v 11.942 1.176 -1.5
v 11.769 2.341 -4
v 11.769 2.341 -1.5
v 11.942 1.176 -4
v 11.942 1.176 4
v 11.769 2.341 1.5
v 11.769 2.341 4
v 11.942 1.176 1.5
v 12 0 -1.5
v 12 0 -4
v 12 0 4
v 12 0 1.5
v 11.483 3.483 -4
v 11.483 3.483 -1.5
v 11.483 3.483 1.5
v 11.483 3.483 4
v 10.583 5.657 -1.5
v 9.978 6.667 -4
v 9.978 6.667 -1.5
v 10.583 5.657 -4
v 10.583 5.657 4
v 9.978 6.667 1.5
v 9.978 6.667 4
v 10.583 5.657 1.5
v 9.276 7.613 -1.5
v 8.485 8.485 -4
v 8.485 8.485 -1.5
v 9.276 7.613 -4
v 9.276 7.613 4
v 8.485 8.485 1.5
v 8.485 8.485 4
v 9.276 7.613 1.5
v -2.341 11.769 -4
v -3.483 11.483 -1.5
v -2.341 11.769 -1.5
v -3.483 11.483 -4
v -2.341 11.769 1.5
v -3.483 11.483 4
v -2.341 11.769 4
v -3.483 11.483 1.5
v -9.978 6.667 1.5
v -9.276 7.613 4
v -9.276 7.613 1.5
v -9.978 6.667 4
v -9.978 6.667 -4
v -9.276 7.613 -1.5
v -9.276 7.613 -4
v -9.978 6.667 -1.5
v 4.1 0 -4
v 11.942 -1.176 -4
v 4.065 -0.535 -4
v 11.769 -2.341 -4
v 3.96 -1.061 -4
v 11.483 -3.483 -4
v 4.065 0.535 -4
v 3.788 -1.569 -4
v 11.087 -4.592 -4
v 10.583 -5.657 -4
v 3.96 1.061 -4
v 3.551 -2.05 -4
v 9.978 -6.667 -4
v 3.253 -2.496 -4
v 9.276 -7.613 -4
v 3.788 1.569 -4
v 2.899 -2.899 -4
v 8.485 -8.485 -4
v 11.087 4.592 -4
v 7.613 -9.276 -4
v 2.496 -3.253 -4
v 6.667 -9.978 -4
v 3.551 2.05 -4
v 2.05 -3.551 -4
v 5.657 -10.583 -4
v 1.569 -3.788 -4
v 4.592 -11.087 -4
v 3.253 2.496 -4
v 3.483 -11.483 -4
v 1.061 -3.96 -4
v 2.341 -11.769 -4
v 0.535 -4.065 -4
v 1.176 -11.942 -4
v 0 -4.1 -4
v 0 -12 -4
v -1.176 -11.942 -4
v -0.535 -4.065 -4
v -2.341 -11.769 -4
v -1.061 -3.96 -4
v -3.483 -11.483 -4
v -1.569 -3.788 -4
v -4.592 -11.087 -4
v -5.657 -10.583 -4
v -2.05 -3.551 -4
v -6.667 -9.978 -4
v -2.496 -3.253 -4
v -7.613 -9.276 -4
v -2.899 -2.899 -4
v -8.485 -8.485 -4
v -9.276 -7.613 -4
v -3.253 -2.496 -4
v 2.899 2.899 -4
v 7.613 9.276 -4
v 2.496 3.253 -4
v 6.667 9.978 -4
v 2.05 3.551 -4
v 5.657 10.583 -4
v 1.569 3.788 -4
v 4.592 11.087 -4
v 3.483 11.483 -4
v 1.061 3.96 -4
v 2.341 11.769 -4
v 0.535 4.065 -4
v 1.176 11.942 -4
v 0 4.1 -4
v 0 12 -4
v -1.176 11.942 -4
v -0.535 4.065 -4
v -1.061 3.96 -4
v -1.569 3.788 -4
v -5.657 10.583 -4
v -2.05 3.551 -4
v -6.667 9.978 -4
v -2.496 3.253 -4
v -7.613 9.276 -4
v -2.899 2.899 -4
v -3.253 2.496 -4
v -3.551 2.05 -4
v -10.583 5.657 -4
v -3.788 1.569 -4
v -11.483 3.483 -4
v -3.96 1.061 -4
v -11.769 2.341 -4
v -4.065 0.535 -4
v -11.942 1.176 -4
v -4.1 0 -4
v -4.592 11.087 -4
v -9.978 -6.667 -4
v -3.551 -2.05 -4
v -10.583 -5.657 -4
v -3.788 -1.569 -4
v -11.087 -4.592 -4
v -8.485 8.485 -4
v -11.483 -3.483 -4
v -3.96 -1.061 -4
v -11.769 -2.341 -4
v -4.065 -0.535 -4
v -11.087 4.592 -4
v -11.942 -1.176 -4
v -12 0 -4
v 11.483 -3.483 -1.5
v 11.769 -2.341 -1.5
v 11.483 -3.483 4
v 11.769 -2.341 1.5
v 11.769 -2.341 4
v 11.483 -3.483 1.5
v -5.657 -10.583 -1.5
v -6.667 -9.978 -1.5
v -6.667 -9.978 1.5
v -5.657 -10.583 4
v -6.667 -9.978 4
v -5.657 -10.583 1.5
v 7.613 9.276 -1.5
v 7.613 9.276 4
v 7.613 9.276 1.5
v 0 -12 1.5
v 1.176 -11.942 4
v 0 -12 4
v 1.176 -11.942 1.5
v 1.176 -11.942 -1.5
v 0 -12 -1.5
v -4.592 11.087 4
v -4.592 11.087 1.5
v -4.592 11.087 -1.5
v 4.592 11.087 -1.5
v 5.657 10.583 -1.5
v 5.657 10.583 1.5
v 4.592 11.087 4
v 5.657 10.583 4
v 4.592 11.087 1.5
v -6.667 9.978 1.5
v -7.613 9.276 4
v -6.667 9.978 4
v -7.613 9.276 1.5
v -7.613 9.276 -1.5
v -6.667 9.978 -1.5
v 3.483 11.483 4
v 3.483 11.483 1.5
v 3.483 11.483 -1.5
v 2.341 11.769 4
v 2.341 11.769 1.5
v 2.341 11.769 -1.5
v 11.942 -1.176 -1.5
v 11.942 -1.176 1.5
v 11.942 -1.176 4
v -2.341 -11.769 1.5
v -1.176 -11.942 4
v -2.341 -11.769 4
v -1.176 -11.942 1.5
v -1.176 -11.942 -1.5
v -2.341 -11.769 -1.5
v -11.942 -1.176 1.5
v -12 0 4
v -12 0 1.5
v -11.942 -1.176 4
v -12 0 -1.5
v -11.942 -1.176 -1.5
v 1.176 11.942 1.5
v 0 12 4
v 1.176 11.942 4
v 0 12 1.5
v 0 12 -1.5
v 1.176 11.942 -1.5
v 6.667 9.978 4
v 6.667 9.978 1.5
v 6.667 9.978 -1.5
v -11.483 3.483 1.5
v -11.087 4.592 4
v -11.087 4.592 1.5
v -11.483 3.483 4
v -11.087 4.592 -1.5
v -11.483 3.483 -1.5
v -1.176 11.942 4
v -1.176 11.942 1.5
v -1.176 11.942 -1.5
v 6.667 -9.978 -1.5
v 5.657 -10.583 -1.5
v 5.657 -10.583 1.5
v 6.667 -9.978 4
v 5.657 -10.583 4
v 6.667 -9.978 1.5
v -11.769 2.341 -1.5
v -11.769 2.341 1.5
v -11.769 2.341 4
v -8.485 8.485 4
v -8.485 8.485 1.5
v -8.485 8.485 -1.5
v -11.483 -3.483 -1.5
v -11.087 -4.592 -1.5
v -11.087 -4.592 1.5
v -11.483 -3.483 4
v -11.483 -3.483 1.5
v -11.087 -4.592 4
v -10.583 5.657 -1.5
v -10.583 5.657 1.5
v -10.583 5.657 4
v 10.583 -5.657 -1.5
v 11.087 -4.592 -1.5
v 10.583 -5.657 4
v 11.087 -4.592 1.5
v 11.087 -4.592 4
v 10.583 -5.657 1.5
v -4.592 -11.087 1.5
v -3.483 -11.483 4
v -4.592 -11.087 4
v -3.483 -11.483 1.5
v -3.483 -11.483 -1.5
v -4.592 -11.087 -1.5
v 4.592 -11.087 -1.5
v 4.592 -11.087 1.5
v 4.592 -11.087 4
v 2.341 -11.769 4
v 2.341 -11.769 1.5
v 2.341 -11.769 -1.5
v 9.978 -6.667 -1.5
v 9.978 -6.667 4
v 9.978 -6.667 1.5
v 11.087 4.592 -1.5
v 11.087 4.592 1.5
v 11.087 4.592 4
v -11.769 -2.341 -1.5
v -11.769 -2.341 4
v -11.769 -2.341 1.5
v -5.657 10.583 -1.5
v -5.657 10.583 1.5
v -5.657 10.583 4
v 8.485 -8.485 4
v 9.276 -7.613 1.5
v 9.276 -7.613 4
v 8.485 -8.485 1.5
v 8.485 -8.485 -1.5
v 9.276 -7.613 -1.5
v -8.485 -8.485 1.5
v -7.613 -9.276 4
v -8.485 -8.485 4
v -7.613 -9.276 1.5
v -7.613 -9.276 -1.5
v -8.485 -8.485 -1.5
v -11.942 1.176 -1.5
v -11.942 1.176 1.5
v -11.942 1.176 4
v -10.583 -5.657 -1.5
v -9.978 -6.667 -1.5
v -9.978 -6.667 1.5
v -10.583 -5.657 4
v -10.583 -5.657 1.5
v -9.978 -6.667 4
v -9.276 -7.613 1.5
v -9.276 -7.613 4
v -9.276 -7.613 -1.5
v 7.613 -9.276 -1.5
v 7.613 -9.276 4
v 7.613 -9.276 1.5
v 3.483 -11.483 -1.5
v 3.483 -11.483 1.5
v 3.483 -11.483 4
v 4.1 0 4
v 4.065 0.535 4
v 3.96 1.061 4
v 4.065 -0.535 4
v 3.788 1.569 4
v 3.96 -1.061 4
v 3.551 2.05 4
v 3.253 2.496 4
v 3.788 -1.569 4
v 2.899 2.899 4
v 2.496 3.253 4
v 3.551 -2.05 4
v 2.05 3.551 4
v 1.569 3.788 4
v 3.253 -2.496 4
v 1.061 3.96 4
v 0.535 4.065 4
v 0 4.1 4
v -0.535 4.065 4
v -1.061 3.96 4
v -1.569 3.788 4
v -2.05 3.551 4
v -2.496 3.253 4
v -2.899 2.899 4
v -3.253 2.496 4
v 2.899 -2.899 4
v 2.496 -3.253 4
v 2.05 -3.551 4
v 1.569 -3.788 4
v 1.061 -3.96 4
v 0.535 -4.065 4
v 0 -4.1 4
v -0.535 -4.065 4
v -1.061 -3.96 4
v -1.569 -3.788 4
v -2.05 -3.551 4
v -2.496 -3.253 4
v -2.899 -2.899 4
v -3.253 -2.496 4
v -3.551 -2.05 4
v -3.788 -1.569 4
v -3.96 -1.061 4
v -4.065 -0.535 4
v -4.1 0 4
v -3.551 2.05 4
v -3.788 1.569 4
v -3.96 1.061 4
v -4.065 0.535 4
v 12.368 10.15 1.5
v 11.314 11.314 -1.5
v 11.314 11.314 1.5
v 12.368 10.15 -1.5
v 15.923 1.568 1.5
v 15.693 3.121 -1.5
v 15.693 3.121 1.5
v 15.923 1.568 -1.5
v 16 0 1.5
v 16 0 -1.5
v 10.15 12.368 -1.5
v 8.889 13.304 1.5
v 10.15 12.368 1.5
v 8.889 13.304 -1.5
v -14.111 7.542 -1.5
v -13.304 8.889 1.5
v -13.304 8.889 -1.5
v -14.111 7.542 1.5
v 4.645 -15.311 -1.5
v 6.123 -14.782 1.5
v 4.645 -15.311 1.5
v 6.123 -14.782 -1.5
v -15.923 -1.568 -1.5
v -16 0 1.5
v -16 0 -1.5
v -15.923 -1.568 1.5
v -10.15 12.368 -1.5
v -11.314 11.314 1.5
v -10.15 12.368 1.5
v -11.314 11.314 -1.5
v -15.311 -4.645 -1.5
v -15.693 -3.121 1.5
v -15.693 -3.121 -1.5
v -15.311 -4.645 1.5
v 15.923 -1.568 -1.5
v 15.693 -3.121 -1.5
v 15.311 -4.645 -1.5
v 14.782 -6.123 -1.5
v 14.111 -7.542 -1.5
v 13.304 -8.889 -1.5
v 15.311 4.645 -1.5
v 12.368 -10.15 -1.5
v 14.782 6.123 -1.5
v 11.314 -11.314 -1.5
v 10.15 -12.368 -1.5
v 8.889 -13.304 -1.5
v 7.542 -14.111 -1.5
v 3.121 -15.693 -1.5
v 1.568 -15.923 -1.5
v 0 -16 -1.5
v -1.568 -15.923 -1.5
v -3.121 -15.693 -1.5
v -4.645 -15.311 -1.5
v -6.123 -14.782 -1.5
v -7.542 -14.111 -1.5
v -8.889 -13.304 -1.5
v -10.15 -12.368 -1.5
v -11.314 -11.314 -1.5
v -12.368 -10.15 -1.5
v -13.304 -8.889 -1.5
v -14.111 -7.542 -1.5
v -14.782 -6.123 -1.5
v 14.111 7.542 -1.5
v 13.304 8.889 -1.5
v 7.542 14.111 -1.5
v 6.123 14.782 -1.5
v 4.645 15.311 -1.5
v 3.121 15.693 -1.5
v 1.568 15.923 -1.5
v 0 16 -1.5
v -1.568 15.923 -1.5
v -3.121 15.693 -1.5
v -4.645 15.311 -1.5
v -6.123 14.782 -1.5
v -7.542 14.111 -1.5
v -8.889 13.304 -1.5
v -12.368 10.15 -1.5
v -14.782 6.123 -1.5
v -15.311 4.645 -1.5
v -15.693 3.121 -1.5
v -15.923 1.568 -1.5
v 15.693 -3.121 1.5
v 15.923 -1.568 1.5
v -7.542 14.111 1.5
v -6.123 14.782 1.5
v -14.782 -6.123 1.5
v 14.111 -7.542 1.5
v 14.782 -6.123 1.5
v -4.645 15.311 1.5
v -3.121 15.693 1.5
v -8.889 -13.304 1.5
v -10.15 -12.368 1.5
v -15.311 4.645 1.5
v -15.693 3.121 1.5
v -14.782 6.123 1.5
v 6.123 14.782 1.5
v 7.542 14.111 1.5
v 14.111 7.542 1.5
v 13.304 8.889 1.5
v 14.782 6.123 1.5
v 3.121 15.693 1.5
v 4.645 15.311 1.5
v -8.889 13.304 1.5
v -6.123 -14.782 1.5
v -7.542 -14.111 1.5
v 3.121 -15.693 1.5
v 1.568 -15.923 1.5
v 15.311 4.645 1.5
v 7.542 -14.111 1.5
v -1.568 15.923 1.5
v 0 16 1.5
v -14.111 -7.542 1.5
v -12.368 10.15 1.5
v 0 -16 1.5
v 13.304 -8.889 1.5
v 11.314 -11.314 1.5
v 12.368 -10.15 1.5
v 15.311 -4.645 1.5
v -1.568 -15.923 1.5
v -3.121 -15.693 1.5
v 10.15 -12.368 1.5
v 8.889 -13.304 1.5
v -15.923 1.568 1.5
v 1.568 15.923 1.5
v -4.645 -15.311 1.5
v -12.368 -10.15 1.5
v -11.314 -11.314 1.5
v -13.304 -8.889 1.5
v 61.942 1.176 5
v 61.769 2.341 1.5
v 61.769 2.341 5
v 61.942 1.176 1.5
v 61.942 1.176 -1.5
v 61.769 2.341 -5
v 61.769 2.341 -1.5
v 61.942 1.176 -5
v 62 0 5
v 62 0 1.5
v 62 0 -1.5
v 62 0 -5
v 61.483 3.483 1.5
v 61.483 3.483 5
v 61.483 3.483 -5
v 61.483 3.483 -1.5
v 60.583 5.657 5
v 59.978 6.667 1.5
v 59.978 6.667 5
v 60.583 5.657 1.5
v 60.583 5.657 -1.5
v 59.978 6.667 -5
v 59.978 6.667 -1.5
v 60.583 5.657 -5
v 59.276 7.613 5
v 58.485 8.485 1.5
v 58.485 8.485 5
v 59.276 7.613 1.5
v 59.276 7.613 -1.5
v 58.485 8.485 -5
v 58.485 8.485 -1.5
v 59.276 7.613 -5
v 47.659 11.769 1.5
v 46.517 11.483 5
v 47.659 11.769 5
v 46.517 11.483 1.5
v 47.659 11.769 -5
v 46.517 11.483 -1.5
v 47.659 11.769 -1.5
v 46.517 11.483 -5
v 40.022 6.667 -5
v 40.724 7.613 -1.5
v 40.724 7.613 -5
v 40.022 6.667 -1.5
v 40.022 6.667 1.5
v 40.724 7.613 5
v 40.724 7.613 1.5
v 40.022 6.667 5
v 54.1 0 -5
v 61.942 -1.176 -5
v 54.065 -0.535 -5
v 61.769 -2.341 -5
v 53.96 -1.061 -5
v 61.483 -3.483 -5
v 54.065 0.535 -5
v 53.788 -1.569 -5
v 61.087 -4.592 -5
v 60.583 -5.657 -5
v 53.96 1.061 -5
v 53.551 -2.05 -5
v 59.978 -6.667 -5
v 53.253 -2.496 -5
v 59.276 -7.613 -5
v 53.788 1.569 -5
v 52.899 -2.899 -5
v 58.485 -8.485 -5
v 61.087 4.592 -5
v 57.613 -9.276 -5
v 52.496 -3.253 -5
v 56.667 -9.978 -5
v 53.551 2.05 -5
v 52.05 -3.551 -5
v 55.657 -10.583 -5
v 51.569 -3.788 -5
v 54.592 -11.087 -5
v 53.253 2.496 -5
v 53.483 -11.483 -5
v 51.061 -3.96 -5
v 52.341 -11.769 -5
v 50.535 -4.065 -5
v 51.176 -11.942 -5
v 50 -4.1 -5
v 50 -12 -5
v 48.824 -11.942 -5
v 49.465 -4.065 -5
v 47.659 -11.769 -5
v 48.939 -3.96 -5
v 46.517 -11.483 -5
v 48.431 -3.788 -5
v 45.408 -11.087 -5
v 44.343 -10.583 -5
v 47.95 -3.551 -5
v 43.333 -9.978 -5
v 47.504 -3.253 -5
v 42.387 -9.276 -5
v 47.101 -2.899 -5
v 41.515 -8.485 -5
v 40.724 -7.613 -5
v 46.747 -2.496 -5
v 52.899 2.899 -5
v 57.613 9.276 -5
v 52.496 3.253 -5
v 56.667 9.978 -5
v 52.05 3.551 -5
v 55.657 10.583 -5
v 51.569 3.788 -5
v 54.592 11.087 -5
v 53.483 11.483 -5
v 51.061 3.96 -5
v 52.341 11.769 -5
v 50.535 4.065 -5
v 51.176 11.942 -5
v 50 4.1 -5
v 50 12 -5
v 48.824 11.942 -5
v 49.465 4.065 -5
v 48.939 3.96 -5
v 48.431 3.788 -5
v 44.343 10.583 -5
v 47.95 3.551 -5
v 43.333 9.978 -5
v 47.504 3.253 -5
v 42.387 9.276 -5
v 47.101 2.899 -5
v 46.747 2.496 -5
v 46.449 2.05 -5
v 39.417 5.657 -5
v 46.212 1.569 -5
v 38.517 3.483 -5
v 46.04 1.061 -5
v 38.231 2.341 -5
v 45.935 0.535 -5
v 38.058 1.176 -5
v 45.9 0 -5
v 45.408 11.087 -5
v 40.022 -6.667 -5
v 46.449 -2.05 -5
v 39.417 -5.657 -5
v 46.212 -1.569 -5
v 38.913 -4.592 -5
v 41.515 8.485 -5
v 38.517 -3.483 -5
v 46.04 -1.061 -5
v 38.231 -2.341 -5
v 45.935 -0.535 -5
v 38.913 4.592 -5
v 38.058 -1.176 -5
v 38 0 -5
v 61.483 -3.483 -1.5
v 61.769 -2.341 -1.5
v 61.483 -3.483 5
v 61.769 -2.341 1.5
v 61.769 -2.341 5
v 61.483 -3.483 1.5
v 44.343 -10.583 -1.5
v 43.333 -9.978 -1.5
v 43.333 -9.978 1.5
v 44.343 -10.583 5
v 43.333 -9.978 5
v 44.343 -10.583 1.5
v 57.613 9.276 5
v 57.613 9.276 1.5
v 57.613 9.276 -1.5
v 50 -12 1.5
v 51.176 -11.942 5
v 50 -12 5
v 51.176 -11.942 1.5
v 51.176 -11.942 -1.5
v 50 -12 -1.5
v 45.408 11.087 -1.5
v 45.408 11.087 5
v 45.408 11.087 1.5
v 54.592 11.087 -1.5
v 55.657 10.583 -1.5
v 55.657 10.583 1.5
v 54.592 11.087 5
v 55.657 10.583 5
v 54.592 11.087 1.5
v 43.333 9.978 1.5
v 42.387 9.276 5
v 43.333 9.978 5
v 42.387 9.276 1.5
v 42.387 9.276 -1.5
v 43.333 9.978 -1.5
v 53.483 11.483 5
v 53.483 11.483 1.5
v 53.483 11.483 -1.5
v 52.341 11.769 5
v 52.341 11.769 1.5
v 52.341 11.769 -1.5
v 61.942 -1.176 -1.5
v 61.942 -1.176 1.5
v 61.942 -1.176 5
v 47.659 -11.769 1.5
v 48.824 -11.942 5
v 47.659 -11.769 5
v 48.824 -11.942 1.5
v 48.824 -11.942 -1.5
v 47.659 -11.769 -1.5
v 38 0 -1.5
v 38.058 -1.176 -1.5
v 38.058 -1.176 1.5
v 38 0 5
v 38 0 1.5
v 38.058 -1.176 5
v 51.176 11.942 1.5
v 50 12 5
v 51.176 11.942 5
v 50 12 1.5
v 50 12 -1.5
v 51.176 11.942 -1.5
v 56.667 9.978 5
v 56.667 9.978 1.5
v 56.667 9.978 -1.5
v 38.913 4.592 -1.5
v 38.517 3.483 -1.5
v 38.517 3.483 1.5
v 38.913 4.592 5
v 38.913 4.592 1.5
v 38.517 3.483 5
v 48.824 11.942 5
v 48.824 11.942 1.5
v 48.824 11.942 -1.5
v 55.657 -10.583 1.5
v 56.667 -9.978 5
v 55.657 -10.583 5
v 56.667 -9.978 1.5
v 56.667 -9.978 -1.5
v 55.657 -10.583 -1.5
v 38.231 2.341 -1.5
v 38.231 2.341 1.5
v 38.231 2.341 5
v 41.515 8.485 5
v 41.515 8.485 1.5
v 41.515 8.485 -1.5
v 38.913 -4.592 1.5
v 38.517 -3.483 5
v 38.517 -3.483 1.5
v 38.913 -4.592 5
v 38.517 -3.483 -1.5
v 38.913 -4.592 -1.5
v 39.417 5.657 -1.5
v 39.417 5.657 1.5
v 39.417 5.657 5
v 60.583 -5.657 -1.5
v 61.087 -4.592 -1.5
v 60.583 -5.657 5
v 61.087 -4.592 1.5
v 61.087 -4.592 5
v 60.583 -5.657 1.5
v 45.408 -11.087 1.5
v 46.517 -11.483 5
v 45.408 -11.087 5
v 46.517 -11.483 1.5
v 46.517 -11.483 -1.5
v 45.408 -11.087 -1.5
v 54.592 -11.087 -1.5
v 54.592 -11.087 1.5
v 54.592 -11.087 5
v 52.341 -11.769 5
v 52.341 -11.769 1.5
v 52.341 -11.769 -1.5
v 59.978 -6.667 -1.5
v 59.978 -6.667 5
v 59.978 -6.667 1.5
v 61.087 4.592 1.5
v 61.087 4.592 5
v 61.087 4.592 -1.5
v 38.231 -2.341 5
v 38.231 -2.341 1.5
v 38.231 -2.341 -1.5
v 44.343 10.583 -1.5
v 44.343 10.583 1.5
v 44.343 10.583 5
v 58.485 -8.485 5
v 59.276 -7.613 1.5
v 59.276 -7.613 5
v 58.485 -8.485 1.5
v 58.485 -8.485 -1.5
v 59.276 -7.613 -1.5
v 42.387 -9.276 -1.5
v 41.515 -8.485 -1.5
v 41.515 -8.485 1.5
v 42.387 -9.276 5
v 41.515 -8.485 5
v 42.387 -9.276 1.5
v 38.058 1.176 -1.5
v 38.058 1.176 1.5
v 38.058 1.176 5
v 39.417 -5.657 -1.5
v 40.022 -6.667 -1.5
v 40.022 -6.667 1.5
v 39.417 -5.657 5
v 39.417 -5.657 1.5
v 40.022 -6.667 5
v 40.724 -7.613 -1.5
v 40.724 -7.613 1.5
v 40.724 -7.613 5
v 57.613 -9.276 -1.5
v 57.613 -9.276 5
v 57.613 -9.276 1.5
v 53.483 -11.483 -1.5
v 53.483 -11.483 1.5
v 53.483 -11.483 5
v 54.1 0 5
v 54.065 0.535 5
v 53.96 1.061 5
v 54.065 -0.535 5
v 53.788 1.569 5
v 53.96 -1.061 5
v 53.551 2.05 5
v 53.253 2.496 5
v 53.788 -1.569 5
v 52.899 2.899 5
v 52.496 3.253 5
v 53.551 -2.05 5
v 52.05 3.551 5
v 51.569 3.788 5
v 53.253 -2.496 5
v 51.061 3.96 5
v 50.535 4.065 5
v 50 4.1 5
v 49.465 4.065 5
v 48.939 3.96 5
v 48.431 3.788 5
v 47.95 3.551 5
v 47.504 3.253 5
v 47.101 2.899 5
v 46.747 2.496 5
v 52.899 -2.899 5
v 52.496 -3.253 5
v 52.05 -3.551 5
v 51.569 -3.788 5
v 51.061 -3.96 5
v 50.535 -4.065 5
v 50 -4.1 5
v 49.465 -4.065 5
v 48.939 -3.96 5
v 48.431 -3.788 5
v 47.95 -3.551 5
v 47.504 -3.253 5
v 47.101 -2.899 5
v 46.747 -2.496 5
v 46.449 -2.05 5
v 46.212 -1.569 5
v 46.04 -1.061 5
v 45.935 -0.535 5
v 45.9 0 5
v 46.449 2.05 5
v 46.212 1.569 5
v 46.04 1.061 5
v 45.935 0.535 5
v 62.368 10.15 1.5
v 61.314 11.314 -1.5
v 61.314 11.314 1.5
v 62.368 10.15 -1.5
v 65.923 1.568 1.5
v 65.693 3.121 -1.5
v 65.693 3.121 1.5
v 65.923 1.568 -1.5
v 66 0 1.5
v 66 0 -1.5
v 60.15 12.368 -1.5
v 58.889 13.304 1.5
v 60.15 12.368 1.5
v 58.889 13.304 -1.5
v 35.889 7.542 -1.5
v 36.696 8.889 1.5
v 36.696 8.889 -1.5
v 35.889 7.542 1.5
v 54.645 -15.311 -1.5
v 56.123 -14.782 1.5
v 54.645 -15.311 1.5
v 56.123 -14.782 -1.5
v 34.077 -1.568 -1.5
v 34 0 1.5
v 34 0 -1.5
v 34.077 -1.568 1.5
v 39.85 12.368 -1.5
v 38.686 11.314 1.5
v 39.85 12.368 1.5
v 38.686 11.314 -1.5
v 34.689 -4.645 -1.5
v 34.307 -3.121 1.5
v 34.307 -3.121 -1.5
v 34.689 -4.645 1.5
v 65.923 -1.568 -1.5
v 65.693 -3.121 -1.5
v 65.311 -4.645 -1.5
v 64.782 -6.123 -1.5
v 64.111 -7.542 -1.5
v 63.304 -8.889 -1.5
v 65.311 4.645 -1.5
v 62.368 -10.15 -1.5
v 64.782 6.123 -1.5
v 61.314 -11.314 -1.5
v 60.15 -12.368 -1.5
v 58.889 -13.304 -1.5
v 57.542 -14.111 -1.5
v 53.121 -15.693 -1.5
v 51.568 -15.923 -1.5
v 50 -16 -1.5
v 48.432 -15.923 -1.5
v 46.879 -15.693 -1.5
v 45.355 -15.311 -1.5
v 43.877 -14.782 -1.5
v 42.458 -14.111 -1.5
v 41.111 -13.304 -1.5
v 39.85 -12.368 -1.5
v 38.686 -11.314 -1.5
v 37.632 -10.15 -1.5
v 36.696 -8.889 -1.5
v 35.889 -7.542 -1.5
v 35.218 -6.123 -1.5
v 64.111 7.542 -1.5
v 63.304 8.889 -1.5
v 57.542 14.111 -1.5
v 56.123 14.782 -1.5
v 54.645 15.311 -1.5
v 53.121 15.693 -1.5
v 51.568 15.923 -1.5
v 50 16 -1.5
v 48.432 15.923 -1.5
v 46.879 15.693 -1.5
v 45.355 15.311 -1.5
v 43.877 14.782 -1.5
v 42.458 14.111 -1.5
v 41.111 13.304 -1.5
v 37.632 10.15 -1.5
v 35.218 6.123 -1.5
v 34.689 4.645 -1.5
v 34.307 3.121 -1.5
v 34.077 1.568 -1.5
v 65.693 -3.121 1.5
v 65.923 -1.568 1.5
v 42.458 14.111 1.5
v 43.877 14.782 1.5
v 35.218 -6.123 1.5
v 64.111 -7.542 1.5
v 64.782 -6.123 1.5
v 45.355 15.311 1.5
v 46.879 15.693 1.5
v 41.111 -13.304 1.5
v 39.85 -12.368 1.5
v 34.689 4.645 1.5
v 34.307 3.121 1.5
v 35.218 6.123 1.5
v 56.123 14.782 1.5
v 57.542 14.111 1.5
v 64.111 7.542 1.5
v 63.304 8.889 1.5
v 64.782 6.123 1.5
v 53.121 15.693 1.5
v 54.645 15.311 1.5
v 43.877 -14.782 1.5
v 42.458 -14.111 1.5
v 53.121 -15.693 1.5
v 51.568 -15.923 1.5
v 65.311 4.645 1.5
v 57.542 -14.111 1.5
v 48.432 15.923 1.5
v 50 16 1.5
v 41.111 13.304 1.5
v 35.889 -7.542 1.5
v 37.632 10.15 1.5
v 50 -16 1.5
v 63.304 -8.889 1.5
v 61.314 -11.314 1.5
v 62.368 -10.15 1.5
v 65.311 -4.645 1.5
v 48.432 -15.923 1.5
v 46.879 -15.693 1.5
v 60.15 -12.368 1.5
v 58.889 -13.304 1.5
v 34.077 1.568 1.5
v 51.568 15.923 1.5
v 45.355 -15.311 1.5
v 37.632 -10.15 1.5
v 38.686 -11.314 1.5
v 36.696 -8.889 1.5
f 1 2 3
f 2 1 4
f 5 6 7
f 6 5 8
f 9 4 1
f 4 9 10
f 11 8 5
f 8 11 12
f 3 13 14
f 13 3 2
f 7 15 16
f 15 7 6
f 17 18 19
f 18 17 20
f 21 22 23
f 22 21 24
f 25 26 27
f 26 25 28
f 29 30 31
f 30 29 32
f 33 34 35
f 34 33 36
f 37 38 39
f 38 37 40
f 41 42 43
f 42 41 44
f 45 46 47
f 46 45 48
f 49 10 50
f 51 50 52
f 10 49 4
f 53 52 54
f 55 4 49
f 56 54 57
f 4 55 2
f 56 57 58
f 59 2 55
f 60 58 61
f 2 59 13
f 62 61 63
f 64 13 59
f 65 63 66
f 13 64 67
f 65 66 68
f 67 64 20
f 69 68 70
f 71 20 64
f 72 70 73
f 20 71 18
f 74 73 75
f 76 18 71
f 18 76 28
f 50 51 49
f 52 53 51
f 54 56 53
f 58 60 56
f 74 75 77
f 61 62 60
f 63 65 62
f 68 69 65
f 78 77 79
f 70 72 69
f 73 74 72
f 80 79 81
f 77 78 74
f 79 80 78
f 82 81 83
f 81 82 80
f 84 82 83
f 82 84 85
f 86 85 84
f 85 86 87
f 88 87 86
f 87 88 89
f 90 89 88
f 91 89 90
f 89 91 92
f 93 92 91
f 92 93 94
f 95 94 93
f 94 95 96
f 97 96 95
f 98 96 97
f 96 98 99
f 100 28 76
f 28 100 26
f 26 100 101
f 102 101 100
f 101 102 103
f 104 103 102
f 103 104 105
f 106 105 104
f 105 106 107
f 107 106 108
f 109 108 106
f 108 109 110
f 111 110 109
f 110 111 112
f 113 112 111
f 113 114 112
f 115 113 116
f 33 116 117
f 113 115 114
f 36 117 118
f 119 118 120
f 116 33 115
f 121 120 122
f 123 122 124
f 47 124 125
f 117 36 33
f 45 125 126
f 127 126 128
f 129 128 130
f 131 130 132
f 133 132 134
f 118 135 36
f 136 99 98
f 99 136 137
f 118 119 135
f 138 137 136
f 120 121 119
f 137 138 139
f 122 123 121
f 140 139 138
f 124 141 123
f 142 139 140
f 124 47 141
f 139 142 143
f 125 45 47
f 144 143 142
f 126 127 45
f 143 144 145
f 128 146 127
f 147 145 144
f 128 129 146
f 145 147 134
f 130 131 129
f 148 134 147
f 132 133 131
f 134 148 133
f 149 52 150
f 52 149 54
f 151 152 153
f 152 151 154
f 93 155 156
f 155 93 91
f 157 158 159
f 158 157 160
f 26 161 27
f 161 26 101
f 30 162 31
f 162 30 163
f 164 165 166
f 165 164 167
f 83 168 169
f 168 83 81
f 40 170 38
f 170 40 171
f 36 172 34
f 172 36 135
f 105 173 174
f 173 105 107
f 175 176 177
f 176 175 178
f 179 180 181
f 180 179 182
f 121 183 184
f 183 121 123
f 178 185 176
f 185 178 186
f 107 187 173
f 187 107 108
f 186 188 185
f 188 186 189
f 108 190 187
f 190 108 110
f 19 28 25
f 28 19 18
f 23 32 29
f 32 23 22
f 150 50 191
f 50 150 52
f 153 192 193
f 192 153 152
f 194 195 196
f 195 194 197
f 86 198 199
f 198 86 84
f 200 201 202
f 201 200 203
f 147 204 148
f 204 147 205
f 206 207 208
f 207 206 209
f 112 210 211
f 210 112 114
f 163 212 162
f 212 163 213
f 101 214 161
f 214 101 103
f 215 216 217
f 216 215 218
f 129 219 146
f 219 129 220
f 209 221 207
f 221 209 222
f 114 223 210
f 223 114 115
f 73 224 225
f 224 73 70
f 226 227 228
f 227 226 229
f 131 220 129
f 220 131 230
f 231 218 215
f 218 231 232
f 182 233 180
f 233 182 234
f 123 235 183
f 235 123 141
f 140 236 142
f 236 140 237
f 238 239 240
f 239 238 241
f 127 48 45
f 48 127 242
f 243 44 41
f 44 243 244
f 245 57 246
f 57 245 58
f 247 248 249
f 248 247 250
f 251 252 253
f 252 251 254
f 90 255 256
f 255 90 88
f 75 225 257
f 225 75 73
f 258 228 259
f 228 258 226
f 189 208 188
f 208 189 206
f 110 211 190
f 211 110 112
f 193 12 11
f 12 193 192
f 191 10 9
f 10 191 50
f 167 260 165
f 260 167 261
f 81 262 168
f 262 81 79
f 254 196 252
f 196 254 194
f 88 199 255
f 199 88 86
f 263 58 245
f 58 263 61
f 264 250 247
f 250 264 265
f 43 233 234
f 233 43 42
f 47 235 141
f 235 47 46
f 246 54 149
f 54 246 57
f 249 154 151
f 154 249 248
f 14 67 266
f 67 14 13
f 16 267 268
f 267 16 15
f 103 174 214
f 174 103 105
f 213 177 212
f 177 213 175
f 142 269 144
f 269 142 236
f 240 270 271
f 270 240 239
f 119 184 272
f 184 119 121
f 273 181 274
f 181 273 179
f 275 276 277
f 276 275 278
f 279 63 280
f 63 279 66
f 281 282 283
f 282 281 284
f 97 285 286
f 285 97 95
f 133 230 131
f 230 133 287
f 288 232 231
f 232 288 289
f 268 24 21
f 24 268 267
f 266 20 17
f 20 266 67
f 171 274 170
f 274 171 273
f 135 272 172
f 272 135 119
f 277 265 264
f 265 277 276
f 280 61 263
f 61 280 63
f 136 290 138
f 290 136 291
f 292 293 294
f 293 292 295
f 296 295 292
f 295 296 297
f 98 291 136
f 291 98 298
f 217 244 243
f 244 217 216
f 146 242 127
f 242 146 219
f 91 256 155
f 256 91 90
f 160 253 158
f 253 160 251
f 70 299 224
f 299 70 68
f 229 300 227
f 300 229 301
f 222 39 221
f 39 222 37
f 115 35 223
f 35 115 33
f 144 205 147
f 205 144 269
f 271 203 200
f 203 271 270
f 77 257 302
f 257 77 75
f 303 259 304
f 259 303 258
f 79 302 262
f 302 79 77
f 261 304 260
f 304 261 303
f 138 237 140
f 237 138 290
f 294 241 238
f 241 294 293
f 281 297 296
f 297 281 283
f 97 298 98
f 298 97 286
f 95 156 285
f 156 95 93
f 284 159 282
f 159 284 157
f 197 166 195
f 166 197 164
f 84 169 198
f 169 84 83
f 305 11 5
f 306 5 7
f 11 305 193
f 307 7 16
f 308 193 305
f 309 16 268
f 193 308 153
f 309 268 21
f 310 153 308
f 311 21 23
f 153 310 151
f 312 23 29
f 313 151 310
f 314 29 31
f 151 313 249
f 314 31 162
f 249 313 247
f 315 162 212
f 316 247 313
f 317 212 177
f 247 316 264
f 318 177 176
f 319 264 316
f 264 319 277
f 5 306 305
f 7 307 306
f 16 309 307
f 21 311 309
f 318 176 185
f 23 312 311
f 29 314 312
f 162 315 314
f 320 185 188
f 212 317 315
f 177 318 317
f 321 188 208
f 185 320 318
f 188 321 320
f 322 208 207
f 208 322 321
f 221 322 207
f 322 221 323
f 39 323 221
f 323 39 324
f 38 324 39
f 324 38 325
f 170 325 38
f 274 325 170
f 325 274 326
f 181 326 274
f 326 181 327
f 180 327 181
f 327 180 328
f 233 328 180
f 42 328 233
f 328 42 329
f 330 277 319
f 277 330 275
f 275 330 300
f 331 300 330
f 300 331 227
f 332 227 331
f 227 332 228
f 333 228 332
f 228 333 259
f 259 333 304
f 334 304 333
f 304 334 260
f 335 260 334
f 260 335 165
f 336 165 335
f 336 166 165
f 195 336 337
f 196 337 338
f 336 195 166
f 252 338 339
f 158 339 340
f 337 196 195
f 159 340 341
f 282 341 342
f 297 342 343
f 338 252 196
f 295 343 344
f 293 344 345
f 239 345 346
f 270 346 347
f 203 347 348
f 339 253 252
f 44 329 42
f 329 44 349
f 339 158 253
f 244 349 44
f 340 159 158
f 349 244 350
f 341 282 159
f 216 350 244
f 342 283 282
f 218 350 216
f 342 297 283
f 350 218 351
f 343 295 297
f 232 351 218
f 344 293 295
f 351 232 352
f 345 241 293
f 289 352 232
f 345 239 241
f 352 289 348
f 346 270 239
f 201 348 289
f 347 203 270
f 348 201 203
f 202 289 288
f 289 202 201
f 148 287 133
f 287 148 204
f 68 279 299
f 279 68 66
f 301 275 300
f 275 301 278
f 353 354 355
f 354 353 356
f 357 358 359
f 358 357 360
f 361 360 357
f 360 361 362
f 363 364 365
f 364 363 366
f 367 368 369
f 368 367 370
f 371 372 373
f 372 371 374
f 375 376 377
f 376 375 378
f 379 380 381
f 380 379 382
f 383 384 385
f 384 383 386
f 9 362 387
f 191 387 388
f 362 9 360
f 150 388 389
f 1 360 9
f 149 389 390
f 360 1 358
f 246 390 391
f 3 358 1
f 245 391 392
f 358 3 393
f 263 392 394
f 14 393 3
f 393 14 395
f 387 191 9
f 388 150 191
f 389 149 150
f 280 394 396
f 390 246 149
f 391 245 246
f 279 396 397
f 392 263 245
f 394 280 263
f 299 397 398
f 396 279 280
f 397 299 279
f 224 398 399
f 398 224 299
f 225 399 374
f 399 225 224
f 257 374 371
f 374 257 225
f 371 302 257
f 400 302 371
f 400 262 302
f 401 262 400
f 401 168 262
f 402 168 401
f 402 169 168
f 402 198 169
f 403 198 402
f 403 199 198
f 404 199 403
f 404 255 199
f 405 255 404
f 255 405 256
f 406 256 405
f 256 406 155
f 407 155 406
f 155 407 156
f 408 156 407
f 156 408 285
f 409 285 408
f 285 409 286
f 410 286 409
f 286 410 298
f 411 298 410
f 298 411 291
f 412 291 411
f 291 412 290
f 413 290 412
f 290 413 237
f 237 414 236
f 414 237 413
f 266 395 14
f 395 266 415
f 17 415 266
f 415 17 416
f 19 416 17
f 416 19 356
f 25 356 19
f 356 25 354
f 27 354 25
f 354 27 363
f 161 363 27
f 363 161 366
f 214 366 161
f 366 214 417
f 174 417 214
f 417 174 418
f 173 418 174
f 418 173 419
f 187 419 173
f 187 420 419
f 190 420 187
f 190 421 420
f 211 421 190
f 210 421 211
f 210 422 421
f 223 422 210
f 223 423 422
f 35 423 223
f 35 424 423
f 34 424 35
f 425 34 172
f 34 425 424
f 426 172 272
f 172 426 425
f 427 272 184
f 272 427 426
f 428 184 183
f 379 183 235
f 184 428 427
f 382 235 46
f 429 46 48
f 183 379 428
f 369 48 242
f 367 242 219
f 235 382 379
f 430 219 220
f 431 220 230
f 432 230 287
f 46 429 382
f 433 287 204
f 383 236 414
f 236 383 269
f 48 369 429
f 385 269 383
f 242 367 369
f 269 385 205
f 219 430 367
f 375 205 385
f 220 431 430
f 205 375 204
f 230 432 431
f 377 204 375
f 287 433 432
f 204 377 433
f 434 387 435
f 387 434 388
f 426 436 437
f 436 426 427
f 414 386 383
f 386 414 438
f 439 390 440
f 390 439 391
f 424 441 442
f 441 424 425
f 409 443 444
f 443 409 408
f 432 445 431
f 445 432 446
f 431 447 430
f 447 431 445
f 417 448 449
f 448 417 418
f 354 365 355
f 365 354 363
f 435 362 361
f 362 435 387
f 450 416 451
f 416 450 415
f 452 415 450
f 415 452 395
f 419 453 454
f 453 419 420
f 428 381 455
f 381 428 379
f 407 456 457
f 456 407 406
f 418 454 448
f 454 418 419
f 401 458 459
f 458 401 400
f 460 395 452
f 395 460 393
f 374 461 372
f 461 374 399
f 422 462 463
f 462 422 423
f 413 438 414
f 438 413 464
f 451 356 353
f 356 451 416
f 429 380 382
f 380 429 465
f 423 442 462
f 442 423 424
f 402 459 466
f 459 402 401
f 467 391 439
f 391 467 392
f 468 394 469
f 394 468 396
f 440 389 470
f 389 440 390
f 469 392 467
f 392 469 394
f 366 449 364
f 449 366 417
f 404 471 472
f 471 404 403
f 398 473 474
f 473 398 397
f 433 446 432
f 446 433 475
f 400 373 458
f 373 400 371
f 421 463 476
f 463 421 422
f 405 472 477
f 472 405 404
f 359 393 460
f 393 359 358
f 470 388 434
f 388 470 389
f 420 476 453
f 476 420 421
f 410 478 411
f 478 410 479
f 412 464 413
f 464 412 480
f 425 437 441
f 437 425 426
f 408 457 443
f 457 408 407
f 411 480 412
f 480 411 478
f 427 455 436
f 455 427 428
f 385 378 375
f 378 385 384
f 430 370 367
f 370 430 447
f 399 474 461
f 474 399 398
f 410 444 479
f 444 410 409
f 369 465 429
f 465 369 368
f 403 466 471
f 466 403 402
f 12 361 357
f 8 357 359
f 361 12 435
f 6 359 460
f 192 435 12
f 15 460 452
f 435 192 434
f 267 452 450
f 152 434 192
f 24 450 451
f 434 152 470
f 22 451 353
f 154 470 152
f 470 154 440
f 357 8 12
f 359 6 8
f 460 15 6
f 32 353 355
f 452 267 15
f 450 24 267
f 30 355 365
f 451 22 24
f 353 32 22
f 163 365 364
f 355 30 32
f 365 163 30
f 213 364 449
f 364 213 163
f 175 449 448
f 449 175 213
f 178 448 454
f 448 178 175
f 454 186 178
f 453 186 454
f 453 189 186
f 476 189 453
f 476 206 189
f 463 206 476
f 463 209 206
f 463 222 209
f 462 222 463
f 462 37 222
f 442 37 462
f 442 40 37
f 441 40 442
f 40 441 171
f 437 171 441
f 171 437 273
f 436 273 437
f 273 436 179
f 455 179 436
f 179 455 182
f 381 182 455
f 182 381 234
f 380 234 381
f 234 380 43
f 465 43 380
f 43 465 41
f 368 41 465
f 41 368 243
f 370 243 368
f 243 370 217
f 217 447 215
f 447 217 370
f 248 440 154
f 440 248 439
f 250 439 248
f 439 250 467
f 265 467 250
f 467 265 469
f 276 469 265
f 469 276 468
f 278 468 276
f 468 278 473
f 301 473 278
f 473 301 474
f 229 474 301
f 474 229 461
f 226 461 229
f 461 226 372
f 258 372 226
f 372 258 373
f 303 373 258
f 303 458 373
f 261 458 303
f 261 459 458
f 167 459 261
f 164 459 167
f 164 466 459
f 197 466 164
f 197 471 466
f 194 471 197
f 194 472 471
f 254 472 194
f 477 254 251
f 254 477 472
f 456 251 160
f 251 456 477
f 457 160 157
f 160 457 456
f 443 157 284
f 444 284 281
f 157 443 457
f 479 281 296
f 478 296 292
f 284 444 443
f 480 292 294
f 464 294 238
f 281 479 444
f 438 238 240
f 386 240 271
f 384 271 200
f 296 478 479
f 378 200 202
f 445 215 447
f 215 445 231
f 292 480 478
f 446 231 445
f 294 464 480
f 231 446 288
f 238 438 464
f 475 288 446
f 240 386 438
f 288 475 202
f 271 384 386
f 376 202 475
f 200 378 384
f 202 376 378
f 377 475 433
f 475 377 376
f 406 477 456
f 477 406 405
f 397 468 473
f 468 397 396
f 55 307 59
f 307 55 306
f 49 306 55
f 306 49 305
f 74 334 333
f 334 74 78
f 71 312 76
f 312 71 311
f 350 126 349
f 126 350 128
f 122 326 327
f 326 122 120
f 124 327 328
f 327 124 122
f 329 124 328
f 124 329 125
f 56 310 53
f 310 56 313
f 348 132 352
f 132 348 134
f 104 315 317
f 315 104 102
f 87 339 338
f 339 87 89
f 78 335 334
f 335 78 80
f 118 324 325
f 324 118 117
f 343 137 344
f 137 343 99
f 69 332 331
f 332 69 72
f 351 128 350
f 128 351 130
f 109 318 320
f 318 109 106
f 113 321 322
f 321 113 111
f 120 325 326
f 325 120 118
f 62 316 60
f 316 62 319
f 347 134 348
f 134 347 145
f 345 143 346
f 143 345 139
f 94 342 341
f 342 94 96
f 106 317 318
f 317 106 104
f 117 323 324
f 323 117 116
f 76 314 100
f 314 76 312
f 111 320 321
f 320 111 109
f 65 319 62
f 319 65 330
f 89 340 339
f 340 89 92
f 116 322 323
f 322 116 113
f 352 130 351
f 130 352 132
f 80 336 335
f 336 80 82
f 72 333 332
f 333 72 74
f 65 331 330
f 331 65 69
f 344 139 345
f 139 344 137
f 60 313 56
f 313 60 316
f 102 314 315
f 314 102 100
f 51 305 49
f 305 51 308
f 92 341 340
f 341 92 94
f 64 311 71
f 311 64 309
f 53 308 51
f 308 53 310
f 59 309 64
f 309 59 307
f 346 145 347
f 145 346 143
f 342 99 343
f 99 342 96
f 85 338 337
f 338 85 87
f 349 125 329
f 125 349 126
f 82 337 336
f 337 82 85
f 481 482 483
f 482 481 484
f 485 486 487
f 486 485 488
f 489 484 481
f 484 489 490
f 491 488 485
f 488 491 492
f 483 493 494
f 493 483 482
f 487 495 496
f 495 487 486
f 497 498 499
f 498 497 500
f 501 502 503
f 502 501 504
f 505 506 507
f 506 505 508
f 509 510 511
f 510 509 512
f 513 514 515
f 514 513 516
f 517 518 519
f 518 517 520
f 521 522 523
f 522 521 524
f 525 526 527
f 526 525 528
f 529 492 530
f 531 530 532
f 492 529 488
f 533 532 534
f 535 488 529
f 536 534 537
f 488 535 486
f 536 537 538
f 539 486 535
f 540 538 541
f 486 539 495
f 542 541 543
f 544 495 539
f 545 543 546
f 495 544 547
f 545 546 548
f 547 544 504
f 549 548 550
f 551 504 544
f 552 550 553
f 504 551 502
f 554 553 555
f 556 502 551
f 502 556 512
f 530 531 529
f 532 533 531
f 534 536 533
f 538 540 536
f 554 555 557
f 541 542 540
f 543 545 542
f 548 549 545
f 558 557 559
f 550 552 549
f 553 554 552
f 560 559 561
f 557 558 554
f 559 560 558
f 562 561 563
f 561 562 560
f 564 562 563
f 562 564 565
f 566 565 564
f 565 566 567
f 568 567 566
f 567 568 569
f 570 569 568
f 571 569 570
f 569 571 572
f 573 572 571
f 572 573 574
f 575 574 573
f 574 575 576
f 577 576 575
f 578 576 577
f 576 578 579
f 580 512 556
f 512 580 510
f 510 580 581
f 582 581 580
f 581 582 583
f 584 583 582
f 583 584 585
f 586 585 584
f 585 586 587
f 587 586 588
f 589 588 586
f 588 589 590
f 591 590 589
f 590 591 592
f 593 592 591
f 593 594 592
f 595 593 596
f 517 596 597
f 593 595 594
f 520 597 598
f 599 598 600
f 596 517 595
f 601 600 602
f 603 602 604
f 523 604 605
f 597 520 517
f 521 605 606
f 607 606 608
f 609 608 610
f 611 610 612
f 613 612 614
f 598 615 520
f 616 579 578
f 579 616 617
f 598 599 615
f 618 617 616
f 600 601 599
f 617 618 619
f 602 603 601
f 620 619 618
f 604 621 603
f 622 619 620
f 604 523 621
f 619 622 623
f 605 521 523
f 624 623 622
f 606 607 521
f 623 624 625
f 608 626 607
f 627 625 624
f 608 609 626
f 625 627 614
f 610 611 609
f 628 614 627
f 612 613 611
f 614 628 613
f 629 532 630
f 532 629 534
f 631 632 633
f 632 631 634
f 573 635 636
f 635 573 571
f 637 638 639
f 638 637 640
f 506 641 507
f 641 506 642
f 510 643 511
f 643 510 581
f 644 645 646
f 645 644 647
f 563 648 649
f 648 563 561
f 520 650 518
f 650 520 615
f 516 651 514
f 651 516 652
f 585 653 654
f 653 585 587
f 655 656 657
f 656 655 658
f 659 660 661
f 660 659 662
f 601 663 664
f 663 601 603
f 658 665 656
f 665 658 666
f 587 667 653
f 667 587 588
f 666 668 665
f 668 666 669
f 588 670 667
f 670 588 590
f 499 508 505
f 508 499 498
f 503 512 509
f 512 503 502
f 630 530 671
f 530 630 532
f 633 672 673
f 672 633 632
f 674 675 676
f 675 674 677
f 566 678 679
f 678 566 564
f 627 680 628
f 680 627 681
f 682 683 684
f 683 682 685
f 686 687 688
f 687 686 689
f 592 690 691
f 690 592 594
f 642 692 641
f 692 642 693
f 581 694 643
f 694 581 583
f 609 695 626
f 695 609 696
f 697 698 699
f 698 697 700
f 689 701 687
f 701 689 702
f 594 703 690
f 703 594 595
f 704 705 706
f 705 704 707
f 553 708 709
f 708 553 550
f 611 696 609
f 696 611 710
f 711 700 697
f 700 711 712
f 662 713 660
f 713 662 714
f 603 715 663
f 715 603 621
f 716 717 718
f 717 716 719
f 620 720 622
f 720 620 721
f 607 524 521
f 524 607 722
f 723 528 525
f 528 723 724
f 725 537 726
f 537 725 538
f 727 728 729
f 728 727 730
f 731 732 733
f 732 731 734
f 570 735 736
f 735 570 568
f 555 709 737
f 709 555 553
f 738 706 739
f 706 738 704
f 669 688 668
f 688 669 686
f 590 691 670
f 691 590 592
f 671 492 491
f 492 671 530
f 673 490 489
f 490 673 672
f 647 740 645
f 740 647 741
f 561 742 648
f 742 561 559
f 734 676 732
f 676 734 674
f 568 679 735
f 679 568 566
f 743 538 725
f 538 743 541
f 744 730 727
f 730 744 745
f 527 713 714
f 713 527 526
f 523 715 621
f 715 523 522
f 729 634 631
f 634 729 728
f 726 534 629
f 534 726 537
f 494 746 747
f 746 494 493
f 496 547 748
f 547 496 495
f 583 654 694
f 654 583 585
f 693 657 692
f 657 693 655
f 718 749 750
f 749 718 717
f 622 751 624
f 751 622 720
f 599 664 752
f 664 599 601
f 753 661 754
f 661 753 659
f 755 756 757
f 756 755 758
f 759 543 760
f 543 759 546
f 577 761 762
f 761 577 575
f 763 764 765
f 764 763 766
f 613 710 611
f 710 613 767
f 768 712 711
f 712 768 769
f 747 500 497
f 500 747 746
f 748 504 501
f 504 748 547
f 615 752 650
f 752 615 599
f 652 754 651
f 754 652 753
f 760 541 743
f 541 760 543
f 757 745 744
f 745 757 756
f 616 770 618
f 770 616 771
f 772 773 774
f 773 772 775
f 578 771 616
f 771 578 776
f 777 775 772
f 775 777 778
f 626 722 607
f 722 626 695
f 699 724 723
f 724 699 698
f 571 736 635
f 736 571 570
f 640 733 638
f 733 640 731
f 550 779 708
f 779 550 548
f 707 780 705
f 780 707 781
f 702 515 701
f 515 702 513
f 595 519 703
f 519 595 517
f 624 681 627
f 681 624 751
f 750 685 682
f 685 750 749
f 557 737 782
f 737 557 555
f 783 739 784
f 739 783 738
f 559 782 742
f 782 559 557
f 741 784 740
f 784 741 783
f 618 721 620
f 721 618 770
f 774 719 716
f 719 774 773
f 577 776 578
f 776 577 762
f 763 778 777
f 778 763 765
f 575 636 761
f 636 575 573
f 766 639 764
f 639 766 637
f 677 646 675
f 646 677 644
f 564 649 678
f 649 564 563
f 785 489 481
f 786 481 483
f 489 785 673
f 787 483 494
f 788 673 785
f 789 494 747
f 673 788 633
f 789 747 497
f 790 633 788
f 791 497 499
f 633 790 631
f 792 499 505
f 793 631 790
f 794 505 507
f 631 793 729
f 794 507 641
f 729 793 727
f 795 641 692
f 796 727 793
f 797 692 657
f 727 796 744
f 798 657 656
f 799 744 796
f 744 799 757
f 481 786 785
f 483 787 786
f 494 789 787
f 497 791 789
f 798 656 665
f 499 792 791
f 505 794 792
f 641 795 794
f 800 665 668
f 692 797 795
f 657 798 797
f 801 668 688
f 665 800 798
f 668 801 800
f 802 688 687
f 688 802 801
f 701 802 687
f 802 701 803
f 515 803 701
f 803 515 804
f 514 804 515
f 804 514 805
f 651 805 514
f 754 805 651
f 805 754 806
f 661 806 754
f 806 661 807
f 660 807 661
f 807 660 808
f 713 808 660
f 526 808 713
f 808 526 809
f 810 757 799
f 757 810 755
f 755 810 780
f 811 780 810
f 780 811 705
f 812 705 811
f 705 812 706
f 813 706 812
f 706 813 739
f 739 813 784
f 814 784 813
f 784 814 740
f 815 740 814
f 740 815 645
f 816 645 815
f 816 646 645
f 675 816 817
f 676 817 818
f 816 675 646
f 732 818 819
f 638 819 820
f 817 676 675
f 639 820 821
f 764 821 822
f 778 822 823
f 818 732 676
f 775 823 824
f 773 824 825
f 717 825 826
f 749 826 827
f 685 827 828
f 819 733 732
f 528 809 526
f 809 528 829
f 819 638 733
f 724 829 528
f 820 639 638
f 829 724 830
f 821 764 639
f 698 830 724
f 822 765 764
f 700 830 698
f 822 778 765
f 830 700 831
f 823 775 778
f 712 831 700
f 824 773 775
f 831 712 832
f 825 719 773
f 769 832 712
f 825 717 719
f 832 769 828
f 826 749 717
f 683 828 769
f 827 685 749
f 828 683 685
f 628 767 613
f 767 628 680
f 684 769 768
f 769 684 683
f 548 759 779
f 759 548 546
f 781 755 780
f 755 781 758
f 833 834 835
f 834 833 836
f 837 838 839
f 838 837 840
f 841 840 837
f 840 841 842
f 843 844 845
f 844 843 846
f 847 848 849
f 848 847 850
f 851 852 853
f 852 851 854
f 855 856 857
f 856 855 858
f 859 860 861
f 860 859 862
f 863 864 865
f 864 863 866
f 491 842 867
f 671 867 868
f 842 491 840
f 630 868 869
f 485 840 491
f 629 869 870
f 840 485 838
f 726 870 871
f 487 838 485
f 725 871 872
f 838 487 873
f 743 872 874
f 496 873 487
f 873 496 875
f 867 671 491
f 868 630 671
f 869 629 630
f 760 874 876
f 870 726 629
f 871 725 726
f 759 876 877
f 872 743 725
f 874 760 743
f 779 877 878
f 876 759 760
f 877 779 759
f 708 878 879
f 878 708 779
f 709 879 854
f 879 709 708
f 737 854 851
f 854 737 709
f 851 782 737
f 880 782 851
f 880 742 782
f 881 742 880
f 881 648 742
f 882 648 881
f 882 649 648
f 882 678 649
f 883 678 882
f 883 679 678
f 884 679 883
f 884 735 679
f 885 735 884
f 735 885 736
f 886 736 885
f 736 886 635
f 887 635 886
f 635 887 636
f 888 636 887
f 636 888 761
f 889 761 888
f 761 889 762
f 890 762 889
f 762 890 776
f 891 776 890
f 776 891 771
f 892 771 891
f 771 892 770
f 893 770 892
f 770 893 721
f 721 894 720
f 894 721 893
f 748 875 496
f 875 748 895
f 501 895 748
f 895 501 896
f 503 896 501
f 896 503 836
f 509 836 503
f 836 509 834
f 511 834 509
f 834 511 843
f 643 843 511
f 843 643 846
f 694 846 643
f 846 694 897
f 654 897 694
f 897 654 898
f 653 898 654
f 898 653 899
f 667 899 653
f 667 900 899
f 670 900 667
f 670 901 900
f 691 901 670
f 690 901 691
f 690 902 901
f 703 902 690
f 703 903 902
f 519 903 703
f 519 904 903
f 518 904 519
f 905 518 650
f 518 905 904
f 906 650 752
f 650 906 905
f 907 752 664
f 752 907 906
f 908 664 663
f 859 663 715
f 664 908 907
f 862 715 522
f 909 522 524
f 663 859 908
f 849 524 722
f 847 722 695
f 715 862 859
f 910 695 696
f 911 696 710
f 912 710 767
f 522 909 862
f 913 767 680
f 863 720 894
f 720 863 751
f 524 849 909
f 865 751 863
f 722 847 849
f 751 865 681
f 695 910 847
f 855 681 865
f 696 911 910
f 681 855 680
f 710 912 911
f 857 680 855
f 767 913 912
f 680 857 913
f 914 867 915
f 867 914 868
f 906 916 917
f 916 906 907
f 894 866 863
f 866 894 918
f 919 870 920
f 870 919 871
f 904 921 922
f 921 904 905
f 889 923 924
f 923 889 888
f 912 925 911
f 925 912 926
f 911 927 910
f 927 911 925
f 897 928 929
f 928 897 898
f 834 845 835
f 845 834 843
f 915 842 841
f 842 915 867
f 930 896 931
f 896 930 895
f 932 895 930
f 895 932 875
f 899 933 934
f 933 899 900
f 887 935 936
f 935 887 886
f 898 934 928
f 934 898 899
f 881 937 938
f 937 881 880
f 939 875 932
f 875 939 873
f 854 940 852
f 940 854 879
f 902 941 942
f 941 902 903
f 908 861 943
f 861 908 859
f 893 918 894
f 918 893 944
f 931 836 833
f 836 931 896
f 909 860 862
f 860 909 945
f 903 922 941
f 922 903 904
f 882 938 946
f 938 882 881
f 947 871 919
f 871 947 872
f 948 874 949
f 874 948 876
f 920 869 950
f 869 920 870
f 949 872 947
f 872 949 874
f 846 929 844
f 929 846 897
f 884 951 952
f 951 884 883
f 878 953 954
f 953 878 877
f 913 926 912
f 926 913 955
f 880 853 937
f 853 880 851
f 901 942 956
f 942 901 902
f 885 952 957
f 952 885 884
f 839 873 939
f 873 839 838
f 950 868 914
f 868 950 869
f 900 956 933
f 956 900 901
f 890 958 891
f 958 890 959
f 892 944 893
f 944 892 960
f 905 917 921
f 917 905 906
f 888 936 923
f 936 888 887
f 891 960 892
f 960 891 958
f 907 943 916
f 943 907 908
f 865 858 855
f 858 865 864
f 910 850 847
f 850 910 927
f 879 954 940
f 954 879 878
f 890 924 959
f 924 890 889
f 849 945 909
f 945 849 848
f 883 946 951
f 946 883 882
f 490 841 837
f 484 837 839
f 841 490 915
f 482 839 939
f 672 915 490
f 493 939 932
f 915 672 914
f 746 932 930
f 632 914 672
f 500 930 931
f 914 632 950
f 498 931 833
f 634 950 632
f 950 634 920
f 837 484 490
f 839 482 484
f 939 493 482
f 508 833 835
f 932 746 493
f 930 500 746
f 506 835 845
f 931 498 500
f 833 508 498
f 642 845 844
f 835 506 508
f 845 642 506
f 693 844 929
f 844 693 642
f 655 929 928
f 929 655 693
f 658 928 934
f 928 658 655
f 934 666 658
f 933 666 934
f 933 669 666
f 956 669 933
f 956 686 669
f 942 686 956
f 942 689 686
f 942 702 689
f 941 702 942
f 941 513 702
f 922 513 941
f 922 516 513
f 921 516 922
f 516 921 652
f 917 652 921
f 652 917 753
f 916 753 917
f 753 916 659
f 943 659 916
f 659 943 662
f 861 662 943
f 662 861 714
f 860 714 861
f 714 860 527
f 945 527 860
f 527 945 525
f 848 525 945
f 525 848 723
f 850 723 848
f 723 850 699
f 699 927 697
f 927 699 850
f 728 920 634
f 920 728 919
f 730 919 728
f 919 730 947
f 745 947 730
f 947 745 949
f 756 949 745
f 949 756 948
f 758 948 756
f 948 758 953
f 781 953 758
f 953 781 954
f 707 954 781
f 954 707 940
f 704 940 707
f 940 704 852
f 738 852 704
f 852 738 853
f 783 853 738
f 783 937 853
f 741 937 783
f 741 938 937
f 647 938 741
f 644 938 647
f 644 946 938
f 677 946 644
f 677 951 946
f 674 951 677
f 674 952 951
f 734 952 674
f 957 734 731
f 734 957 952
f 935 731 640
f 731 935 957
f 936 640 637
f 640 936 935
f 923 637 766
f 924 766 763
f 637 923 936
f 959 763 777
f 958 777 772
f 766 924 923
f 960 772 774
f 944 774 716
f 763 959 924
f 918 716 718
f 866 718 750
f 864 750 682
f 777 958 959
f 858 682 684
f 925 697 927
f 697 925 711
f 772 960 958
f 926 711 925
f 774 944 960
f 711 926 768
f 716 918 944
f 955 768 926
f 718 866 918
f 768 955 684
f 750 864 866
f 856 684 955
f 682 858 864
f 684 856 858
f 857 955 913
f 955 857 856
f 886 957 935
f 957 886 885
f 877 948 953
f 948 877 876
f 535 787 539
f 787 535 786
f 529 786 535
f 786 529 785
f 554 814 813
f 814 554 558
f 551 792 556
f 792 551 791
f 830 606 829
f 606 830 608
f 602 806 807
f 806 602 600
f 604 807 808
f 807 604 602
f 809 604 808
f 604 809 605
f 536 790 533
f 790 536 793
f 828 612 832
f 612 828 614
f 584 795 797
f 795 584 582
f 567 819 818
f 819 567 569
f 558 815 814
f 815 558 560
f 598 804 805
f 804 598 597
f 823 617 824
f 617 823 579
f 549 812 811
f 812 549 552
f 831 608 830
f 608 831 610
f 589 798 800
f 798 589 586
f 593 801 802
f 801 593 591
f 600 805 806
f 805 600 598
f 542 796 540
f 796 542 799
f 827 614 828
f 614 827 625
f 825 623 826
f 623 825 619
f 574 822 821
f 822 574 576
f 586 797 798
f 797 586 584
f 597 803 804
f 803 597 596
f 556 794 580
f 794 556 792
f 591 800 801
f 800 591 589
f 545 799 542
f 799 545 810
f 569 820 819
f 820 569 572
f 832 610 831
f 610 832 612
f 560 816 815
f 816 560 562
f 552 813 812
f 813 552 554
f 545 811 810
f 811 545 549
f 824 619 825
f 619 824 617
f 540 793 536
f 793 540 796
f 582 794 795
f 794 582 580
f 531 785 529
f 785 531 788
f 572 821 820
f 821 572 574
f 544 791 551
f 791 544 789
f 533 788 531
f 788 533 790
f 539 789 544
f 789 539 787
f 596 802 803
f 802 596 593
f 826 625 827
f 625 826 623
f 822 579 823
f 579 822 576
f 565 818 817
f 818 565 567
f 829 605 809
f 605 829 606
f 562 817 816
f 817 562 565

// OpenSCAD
/*
 * BEARING_HOUSERS.scad
 * Upper and lower bearing housers for the central HVAT rotor (608ZZ bearings)
 * Press-fit tolerance (+0.1 mm interference on bore).
 * Flanged for screwing to top/bottom end plates.
 *
 * From the May 2026 Grok design conversation.
 */

module bearing_houser(od=24, id=8.2, h=8, flange_d=32) {
    difference() {
        union() {
            // Main cylinder (press fit for bearing)
            cylinder(d=od, h=h, center=true, $fn=64);
            // Mounting flange
            cylinder(d=flange_d, h=3, center=true, $fn=64);
        }
        // Bearing bore (slight interference for press fit)
        cylinder(d=id, h=h+2, center=true, $fn=48);
    }
}

// Upper and lower (lower can be thicker for stability)
translate([0, 0, 0])   bearing_houser(h=8, flange_d=32);   // upper
translate([50, 0, 0]) bearing_houser(h=10, flange_d=32);  // lower (thicker)

// Mounting: screw flanges to top and bottom end plates.
// Add thin PTFE thrust washer between HVAT top and upper bearing if needed.
